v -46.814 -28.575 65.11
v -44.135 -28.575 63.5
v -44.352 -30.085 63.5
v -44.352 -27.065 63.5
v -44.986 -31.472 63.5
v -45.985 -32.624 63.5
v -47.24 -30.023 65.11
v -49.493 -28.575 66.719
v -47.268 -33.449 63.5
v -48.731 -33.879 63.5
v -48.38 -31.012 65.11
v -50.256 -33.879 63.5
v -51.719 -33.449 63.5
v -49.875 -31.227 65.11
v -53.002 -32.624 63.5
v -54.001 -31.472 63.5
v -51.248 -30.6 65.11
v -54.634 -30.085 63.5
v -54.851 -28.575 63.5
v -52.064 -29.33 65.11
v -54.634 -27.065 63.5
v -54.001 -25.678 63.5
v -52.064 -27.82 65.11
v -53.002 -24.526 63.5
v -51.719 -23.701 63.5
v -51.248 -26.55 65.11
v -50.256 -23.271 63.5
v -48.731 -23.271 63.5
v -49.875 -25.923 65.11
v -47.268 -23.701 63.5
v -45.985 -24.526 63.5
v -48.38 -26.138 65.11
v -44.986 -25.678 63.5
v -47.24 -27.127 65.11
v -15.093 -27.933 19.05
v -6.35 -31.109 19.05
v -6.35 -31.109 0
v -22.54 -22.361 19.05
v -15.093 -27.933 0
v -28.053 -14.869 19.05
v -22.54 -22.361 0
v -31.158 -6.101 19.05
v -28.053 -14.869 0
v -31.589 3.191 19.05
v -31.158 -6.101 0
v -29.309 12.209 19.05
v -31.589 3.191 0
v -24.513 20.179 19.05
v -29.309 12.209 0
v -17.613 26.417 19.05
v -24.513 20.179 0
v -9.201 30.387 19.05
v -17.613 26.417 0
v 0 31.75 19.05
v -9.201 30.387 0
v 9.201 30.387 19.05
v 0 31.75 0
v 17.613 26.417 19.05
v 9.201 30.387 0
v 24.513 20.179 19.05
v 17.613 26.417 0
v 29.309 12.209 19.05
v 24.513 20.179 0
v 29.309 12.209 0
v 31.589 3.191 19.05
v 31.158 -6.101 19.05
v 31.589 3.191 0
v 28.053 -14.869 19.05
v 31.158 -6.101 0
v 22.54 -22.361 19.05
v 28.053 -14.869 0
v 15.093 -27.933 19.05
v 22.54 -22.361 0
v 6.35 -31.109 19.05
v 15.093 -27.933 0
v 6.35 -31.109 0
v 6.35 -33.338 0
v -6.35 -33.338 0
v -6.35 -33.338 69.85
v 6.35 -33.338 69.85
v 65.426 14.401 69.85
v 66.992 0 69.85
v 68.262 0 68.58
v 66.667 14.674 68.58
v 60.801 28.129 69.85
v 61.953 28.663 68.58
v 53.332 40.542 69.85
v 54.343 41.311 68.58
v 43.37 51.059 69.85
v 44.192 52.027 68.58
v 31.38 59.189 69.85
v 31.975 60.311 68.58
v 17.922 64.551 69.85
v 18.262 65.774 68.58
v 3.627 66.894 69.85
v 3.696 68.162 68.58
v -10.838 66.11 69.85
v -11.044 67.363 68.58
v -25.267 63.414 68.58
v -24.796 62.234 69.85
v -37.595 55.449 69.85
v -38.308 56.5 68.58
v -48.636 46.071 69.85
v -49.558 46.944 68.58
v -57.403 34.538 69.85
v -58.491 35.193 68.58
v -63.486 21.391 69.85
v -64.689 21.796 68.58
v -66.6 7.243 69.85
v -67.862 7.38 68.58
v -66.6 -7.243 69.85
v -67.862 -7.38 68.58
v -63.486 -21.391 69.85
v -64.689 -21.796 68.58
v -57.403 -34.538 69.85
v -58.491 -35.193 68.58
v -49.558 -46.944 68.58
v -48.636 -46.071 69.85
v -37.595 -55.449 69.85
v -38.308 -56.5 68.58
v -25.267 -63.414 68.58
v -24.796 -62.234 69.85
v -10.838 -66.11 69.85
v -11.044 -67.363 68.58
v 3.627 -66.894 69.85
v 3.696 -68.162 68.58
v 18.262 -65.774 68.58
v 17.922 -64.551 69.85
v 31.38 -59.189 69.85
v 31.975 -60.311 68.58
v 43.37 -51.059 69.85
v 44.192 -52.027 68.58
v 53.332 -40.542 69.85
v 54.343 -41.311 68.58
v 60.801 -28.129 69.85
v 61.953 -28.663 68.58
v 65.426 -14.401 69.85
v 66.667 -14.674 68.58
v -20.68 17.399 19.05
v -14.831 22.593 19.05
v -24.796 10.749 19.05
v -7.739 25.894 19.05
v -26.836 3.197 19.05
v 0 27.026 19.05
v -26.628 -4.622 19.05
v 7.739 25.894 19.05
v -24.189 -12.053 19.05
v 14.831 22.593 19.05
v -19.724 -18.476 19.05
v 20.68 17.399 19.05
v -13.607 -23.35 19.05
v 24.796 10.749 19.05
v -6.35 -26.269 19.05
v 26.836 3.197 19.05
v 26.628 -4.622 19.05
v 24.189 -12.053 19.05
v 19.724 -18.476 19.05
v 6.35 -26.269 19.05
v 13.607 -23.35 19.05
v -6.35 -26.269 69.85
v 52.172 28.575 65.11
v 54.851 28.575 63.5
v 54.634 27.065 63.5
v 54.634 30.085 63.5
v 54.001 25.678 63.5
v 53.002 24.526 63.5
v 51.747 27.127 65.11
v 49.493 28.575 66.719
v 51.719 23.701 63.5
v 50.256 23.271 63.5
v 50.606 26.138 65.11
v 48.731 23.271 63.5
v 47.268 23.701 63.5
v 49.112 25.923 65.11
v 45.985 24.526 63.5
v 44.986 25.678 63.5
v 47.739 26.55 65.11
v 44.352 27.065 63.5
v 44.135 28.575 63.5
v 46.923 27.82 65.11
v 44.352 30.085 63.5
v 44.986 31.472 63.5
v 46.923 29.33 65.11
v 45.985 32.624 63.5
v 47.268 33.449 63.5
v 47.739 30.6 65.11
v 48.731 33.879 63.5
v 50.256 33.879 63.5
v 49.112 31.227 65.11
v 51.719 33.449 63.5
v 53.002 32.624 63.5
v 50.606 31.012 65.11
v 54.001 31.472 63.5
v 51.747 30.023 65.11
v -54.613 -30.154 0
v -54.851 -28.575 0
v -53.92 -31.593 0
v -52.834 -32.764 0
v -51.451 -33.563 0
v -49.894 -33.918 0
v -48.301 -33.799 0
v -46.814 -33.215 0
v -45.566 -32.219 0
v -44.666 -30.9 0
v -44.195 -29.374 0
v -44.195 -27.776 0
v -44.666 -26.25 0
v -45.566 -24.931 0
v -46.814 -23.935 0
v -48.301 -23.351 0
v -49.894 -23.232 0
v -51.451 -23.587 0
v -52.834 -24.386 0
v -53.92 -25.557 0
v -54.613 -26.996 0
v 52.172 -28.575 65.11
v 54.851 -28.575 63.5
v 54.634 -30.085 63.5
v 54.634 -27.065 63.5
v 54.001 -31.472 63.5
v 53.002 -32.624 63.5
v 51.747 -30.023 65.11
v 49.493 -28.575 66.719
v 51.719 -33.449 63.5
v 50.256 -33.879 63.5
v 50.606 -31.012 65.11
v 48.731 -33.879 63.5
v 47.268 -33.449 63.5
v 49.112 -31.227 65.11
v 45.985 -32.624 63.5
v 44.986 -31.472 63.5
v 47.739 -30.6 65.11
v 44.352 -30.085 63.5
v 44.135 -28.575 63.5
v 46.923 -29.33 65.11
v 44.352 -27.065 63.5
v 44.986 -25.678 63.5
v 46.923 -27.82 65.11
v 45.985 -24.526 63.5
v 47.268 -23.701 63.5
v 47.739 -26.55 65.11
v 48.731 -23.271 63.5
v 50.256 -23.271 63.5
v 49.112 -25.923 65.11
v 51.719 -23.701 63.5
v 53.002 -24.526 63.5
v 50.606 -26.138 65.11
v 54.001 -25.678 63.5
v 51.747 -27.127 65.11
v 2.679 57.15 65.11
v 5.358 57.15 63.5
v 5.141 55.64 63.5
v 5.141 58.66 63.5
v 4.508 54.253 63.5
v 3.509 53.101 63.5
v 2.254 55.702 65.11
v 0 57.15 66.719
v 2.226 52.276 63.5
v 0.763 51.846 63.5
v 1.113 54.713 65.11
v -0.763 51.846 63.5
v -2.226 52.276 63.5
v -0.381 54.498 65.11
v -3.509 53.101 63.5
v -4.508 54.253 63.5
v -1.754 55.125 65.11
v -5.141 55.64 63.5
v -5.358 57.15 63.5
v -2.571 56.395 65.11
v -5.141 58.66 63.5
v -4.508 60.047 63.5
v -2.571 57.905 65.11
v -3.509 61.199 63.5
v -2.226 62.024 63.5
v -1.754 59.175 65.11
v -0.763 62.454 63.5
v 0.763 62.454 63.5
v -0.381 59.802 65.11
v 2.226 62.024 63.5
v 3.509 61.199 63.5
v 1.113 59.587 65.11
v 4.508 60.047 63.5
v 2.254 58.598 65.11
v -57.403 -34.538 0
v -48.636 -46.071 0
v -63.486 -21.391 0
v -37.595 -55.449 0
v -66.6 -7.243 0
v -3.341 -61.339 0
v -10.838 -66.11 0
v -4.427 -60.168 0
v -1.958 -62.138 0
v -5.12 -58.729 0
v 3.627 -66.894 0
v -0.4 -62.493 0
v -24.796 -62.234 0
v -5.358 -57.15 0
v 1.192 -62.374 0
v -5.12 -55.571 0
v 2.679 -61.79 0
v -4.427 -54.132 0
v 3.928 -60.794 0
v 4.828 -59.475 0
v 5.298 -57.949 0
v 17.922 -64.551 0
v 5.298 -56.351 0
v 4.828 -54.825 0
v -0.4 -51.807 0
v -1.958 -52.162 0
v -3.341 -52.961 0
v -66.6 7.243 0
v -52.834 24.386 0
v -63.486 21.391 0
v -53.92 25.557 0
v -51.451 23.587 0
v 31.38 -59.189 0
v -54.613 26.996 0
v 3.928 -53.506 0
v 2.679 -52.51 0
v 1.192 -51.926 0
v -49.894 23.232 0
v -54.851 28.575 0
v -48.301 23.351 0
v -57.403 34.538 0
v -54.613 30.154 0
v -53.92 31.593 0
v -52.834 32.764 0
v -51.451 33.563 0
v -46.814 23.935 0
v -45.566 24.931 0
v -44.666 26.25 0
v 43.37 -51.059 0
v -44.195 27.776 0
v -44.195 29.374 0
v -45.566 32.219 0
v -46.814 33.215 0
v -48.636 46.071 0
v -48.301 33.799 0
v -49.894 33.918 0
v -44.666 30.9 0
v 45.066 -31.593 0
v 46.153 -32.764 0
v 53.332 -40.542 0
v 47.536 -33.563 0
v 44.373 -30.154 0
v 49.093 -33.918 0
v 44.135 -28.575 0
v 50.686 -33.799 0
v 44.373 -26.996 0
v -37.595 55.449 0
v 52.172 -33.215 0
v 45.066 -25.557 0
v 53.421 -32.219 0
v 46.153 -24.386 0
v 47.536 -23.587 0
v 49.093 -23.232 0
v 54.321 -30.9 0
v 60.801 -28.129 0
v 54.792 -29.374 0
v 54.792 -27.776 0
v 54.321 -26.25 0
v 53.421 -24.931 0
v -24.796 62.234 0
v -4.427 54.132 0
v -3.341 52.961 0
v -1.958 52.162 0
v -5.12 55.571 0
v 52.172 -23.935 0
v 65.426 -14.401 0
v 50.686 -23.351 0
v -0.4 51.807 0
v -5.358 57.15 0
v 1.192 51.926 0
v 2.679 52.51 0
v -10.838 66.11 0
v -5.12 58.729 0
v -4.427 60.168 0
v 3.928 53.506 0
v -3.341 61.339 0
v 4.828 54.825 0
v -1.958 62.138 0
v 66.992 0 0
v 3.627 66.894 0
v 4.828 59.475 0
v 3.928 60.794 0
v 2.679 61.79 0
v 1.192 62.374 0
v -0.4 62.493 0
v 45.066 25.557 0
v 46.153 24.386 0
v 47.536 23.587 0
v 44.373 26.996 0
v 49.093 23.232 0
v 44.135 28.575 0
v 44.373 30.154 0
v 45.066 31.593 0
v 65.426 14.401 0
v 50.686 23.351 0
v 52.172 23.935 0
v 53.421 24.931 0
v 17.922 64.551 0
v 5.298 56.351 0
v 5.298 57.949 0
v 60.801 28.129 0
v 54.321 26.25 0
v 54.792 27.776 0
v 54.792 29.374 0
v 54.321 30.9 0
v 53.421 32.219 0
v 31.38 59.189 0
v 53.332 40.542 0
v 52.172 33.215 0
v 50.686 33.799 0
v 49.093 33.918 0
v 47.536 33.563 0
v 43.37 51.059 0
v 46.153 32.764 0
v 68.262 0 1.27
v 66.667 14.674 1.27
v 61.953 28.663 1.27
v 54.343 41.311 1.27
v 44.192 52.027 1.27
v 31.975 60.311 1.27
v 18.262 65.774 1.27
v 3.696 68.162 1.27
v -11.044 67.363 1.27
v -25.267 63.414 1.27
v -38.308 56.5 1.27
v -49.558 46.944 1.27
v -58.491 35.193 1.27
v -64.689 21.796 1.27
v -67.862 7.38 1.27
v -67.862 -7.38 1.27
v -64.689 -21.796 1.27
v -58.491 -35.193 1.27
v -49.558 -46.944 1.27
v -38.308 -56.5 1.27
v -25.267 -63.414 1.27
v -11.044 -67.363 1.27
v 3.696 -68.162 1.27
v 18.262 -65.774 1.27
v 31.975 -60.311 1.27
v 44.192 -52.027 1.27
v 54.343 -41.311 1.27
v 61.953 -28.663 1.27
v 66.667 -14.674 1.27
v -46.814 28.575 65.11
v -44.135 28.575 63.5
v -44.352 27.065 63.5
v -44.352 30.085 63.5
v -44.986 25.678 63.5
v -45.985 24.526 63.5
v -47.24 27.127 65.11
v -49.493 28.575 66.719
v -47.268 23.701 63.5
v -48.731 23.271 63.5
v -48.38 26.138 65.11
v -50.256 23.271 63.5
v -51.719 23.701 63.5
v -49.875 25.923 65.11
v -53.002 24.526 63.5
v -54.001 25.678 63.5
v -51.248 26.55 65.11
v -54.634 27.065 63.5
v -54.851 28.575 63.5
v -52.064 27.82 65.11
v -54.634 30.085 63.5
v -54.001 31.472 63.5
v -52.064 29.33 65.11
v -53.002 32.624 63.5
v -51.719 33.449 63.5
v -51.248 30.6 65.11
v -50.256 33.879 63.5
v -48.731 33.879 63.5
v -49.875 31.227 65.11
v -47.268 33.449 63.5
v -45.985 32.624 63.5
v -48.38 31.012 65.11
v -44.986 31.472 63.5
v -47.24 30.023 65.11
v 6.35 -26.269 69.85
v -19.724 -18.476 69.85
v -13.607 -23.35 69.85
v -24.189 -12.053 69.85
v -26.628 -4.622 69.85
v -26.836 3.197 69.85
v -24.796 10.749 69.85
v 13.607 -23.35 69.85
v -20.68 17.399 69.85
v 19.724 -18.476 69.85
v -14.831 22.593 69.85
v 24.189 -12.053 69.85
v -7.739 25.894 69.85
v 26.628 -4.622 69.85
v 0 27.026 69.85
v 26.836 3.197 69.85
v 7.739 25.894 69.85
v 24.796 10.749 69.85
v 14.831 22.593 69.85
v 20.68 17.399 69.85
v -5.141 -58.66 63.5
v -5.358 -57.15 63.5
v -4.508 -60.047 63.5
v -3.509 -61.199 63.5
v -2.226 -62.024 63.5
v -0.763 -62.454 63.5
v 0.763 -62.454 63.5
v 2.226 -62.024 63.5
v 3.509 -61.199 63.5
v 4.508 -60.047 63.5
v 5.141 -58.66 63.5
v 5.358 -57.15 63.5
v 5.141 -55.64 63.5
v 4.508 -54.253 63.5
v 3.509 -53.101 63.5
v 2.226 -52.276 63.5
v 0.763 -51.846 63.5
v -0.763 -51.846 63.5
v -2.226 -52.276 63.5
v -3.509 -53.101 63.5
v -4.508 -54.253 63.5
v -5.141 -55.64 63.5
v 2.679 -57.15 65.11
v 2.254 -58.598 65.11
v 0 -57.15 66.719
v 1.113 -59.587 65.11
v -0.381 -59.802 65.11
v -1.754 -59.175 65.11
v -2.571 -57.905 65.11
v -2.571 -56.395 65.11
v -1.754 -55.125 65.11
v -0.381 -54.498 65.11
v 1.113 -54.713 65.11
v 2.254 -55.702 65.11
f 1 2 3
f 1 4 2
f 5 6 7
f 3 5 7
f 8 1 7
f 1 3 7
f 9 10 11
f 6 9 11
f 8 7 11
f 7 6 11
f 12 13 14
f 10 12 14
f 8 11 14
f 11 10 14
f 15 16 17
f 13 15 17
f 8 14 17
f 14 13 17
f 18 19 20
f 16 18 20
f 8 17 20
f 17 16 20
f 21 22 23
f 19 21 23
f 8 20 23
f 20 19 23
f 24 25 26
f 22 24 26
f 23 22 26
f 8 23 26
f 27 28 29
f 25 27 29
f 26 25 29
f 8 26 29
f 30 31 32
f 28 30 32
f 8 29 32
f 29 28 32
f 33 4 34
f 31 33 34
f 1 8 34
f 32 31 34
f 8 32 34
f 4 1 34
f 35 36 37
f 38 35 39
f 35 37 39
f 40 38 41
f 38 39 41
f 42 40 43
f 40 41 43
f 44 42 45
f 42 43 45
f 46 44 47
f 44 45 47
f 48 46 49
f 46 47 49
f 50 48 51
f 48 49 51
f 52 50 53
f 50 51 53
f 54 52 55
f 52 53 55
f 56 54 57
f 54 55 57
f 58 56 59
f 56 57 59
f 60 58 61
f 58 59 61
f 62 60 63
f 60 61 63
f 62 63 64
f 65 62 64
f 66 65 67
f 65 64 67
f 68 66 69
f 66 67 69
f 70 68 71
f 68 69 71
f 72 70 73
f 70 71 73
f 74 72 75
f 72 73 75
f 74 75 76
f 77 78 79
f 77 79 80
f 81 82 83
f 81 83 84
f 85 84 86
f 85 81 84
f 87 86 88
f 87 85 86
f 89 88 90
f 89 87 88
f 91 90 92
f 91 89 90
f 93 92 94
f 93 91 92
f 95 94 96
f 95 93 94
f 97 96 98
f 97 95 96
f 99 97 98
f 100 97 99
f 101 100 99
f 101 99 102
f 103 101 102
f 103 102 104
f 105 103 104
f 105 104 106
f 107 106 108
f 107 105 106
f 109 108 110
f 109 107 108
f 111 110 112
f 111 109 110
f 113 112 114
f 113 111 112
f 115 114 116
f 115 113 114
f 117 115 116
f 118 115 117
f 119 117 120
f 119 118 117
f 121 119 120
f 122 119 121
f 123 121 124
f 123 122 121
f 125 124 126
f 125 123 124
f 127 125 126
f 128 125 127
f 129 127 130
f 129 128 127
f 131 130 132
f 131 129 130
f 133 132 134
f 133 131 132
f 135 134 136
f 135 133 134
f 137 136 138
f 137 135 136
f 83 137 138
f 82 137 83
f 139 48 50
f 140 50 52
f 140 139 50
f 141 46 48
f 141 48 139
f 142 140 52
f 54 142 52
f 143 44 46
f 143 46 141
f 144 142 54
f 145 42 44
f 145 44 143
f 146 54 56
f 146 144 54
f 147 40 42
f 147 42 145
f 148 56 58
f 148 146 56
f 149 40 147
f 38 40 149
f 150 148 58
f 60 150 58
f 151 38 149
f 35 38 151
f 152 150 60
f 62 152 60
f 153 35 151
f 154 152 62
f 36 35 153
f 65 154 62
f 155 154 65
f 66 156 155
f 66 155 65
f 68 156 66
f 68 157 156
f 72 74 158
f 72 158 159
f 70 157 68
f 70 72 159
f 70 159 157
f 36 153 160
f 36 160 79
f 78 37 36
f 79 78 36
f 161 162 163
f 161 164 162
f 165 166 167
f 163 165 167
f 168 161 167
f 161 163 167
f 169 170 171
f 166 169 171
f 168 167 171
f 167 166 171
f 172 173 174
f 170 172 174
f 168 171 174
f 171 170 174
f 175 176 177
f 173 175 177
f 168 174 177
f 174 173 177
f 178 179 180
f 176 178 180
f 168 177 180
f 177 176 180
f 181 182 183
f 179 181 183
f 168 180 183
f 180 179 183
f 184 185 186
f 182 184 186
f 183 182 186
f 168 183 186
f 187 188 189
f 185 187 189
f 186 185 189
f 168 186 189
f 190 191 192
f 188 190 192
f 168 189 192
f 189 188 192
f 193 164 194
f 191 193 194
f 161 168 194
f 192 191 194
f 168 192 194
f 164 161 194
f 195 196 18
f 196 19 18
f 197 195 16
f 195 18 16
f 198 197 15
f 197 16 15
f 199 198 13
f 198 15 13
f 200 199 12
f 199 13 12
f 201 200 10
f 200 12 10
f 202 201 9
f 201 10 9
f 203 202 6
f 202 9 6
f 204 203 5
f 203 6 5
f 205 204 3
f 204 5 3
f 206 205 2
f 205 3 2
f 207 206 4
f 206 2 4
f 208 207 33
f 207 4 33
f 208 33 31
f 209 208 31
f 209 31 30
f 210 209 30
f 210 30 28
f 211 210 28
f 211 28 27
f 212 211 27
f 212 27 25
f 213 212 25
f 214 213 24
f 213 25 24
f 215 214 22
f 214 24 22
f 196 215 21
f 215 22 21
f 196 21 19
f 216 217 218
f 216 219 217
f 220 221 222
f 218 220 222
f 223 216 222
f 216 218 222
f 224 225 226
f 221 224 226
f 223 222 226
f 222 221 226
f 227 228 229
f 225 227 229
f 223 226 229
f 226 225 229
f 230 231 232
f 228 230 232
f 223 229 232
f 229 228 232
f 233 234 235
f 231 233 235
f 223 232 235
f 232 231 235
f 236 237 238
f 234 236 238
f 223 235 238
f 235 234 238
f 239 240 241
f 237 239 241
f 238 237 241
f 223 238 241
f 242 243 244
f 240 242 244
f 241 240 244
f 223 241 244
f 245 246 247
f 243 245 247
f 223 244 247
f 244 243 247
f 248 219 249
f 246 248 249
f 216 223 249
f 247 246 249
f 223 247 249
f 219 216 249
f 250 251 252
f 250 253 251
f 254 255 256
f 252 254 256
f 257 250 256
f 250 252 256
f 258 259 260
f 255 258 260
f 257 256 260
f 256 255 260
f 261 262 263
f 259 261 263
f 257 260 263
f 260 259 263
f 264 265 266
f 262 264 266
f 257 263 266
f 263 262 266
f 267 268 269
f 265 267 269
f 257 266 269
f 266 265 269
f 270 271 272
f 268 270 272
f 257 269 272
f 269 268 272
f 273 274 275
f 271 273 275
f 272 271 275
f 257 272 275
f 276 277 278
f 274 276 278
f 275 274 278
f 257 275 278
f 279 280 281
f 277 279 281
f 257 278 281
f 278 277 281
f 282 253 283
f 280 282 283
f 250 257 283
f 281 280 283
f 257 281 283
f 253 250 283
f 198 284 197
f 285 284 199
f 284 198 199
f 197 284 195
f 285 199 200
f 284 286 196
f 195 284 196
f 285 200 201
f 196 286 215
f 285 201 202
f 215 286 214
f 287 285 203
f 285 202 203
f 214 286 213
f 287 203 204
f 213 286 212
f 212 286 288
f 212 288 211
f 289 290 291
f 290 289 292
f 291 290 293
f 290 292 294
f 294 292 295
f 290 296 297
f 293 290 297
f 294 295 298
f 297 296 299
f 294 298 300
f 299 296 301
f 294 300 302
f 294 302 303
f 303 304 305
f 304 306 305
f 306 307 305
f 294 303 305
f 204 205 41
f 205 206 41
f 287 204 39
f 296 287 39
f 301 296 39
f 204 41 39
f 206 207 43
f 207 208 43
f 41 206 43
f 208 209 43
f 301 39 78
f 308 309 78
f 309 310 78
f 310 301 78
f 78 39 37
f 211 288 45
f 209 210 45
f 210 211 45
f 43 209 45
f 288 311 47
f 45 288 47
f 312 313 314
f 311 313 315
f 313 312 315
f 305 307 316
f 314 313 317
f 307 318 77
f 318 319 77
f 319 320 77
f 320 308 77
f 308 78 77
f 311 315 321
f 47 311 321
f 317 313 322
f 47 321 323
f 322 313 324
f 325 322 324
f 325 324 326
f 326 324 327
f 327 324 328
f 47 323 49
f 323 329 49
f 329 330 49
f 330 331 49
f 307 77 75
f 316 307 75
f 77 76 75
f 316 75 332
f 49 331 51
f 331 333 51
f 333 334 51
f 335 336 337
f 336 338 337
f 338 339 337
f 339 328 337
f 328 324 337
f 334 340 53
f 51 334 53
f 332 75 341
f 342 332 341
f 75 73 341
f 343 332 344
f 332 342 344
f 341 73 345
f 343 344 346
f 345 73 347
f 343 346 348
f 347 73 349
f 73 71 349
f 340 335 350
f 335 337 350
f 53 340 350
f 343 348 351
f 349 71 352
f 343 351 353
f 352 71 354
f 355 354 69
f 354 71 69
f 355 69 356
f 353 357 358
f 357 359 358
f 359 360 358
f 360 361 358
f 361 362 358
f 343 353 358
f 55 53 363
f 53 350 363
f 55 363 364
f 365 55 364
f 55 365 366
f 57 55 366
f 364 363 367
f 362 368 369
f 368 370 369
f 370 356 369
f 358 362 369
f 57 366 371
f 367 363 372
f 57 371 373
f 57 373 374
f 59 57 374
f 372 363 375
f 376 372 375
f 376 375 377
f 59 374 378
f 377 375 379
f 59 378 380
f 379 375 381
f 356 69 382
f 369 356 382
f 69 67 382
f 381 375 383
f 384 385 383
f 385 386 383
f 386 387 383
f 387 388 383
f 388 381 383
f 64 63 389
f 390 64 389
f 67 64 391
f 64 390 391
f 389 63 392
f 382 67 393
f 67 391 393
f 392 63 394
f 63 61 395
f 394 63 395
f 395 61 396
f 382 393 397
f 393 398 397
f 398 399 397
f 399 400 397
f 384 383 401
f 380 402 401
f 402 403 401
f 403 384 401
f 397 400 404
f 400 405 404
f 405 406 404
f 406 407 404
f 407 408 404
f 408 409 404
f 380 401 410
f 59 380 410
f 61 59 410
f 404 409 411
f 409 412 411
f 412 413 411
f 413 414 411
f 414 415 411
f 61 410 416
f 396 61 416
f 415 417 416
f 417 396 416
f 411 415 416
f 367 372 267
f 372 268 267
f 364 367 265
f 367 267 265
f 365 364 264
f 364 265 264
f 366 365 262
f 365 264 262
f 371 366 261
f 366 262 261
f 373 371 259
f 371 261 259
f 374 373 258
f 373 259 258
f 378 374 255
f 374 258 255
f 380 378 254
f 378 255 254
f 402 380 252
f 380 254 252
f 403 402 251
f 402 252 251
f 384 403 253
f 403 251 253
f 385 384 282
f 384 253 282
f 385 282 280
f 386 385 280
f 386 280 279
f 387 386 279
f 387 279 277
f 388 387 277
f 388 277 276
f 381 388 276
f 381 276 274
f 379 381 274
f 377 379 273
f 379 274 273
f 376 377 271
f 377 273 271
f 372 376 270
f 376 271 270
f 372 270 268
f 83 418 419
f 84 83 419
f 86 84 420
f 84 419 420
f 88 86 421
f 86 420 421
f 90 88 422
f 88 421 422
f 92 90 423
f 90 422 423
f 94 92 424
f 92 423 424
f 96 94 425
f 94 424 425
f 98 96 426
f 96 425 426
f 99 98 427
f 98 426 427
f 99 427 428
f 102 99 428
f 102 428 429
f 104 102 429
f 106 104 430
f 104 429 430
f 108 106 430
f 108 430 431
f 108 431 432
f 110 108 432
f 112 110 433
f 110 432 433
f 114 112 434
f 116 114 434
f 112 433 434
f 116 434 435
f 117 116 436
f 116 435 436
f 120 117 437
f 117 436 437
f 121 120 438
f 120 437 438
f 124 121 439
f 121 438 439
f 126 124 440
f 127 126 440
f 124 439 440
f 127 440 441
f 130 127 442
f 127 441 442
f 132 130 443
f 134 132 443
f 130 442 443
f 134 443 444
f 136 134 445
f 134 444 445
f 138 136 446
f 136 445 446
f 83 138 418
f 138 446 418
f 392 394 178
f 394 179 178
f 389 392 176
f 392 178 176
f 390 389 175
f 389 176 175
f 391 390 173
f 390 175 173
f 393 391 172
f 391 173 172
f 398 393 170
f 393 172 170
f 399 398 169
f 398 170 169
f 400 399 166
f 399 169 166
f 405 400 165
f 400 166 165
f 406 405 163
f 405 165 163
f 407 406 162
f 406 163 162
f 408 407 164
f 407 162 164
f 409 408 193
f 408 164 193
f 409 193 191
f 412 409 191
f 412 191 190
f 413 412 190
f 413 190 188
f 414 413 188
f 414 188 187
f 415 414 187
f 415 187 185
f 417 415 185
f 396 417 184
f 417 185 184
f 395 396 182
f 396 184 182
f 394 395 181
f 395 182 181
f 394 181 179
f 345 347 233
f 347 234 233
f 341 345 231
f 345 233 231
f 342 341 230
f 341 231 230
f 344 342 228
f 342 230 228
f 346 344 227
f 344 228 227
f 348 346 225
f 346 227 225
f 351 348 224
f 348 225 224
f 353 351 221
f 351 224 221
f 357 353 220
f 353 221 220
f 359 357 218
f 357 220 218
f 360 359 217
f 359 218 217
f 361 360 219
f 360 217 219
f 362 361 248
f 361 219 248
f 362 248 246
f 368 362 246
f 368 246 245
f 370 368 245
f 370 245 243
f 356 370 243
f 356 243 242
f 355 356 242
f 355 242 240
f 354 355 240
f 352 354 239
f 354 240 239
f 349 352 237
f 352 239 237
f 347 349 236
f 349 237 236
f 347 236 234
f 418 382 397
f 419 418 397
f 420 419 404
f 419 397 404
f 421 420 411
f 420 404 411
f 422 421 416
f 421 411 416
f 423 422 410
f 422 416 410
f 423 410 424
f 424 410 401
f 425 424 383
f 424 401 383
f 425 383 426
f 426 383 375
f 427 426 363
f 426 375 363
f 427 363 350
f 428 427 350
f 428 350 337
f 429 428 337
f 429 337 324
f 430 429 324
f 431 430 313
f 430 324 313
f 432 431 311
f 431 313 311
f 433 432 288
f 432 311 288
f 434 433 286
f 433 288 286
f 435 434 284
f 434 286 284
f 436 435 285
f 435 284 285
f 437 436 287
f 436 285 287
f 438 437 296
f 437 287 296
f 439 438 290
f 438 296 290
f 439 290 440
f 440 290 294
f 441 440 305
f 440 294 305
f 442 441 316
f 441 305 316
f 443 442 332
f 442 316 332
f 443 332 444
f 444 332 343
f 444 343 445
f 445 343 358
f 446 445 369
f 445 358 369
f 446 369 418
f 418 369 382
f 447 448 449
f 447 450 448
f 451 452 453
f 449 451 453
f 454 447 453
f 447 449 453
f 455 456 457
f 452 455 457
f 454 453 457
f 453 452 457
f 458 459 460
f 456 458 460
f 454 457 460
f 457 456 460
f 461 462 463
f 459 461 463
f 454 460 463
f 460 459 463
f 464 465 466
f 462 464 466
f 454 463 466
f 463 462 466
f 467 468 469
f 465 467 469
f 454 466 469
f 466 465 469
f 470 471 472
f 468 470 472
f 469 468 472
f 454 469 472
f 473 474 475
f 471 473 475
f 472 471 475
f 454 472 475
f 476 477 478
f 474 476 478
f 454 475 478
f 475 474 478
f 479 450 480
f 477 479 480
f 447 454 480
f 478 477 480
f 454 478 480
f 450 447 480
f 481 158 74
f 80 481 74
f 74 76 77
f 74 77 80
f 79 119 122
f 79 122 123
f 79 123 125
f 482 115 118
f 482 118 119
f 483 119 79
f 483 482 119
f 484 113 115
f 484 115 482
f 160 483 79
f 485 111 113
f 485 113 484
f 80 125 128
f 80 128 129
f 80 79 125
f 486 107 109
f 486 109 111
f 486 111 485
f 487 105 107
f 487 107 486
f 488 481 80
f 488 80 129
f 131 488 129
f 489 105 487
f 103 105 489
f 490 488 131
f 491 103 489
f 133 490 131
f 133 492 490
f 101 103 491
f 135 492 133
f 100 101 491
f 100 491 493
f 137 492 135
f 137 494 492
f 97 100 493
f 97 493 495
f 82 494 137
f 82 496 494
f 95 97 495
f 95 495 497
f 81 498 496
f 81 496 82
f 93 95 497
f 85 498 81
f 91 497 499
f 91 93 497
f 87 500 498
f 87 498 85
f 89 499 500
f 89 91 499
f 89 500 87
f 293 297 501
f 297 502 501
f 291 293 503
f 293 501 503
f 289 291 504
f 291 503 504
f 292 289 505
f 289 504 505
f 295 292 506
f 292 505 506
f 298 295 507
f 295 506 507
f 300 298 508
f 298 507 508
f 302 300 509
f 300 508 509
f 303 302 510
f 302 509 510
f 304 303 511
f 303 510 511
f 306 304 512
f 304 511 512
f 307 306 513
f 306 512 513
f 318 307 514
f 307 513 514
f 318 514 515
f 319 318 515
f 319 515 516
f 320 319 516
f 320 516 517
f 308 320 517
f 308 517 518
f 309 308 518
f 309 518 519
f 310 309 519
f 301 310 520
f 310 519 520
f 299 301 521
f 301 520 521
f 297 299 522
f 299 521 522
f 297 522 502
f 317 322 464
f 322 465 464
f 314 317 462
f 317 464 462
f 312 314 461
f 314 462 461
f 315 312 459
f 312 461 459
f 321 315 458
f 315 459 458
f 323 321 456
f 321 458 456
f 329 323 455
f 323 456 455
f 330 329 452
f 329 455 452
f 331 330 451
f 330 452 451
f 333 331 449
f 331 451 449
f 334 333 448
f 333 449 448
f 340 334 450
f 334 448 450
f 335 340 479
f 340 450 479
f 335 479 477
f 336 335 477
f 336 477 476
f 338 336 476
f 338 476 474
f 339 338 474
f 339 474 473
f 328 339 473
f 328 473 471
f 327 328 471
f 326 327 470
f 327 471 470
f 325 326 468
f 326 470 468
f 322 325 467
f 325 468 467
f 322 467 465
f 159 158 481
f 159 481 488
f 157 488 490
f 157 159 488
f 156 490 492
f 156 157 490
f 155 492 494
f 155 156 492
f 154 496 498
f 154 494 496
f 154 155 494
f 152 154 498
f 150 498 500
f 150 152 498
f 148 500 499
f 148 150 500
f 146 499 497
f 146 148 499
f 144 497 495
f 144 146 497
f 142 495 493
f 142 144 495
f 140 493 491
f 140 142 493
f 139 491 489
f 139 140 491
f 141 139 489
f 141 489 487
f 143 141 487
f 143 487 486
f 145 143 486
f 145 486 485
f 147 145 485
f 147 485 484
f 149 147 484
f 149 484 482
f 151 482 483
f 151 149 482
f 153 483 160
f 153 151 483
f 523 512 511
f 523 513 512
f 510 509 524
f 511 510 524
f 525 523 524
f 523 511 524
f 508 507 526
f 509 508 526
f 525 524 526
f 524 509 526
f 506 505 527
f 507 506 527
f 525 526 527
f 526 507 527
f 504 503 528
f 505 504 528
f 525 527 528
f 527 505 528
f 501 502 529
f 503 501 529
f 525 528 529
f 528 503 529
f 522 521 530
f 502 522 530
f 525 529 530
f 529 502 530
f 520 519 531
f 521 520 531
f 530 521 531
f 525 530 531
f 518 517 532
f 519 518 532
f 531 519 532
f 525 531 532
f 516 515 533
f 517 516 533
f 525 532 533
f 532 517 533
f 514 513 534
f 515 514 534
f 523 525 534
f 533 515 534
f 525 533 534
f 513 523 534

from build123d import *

# Parameters (mm, degrees)
F0_R     = 68.2625
F0_R_2   = 27.0256
F1_DEPTH = 69.85
F3_R     = 31.75
F4_DEPTH = 19.05
F5_W     = 12.7
F5_H     = 33.3375
F6_DEPTH = 69.851
F7_SIZE  = 1.27
F8_D     = 10.71626
F8_DEPTH = 63.5
F8_TIP   = 3.2194893086


with BuildPart() as f1:
    # F0 (on Top) → F1 (new body)
    with BuildSketch(Plane.XY):
        Circle(F0_R)
        Circle(F0_R_2, mode=Mode.SUBTRACT)
    extrude(amount=F1_DEPTH)

    # F3 (on face) → F4 (cut)
    with BuildSketch(Plane(origin=(0, 0, 0), x_dir=(1, 0, 0), z_dir=(0, 0, -1))):
        Circle(F3_R)
    extrude(amount=-F4_DEPTH, mode=Mode.SUBTRACT)

    # F5 (on face) → F6 (cut, through all)
    with BuildSketch(Plane(origin=(0, 0, 0), x_dir=(1, 0, 0), z_dir=(0, 0, -1))):
        with Locations((0, 16.66875)):
            Rectangle(F5_W, F5_H)
    extrude(amount=-F6_DEPTH, mode=Mode.SUBTRACT)

    # F7
    f7_edges = [f1.edges().sort_by_distance(p)[0] for p in [
        (-68.2625, 0, 69.85),
        (-68.2625, 0, 0),
    ]]
    chamfer(f7_edges, length=F7_SIZE)

    # F8
    with Locations(Plane(origin=(0, 0, 0), x_dir=(1, 0, 0), z_dir=(0, 0, -1))):
        with Locations((0, 57.15), (-49.4933518263, 28.575), (49.4933518263, 28.575), (49.4933518263, -28.575), (0, -57.15), (-49.4933518263, -28.575)):
            Hole(F8_D / 2, depth=F8_DEPTH)
            with Locations((0, 0, -(F8_DEPTH + F8_TIP / 2))):  # 118° drill point
                Cone(0, F8_D / 2, F8_TIP, mode=Mode.SUBTRACT)


solid = f1.part
